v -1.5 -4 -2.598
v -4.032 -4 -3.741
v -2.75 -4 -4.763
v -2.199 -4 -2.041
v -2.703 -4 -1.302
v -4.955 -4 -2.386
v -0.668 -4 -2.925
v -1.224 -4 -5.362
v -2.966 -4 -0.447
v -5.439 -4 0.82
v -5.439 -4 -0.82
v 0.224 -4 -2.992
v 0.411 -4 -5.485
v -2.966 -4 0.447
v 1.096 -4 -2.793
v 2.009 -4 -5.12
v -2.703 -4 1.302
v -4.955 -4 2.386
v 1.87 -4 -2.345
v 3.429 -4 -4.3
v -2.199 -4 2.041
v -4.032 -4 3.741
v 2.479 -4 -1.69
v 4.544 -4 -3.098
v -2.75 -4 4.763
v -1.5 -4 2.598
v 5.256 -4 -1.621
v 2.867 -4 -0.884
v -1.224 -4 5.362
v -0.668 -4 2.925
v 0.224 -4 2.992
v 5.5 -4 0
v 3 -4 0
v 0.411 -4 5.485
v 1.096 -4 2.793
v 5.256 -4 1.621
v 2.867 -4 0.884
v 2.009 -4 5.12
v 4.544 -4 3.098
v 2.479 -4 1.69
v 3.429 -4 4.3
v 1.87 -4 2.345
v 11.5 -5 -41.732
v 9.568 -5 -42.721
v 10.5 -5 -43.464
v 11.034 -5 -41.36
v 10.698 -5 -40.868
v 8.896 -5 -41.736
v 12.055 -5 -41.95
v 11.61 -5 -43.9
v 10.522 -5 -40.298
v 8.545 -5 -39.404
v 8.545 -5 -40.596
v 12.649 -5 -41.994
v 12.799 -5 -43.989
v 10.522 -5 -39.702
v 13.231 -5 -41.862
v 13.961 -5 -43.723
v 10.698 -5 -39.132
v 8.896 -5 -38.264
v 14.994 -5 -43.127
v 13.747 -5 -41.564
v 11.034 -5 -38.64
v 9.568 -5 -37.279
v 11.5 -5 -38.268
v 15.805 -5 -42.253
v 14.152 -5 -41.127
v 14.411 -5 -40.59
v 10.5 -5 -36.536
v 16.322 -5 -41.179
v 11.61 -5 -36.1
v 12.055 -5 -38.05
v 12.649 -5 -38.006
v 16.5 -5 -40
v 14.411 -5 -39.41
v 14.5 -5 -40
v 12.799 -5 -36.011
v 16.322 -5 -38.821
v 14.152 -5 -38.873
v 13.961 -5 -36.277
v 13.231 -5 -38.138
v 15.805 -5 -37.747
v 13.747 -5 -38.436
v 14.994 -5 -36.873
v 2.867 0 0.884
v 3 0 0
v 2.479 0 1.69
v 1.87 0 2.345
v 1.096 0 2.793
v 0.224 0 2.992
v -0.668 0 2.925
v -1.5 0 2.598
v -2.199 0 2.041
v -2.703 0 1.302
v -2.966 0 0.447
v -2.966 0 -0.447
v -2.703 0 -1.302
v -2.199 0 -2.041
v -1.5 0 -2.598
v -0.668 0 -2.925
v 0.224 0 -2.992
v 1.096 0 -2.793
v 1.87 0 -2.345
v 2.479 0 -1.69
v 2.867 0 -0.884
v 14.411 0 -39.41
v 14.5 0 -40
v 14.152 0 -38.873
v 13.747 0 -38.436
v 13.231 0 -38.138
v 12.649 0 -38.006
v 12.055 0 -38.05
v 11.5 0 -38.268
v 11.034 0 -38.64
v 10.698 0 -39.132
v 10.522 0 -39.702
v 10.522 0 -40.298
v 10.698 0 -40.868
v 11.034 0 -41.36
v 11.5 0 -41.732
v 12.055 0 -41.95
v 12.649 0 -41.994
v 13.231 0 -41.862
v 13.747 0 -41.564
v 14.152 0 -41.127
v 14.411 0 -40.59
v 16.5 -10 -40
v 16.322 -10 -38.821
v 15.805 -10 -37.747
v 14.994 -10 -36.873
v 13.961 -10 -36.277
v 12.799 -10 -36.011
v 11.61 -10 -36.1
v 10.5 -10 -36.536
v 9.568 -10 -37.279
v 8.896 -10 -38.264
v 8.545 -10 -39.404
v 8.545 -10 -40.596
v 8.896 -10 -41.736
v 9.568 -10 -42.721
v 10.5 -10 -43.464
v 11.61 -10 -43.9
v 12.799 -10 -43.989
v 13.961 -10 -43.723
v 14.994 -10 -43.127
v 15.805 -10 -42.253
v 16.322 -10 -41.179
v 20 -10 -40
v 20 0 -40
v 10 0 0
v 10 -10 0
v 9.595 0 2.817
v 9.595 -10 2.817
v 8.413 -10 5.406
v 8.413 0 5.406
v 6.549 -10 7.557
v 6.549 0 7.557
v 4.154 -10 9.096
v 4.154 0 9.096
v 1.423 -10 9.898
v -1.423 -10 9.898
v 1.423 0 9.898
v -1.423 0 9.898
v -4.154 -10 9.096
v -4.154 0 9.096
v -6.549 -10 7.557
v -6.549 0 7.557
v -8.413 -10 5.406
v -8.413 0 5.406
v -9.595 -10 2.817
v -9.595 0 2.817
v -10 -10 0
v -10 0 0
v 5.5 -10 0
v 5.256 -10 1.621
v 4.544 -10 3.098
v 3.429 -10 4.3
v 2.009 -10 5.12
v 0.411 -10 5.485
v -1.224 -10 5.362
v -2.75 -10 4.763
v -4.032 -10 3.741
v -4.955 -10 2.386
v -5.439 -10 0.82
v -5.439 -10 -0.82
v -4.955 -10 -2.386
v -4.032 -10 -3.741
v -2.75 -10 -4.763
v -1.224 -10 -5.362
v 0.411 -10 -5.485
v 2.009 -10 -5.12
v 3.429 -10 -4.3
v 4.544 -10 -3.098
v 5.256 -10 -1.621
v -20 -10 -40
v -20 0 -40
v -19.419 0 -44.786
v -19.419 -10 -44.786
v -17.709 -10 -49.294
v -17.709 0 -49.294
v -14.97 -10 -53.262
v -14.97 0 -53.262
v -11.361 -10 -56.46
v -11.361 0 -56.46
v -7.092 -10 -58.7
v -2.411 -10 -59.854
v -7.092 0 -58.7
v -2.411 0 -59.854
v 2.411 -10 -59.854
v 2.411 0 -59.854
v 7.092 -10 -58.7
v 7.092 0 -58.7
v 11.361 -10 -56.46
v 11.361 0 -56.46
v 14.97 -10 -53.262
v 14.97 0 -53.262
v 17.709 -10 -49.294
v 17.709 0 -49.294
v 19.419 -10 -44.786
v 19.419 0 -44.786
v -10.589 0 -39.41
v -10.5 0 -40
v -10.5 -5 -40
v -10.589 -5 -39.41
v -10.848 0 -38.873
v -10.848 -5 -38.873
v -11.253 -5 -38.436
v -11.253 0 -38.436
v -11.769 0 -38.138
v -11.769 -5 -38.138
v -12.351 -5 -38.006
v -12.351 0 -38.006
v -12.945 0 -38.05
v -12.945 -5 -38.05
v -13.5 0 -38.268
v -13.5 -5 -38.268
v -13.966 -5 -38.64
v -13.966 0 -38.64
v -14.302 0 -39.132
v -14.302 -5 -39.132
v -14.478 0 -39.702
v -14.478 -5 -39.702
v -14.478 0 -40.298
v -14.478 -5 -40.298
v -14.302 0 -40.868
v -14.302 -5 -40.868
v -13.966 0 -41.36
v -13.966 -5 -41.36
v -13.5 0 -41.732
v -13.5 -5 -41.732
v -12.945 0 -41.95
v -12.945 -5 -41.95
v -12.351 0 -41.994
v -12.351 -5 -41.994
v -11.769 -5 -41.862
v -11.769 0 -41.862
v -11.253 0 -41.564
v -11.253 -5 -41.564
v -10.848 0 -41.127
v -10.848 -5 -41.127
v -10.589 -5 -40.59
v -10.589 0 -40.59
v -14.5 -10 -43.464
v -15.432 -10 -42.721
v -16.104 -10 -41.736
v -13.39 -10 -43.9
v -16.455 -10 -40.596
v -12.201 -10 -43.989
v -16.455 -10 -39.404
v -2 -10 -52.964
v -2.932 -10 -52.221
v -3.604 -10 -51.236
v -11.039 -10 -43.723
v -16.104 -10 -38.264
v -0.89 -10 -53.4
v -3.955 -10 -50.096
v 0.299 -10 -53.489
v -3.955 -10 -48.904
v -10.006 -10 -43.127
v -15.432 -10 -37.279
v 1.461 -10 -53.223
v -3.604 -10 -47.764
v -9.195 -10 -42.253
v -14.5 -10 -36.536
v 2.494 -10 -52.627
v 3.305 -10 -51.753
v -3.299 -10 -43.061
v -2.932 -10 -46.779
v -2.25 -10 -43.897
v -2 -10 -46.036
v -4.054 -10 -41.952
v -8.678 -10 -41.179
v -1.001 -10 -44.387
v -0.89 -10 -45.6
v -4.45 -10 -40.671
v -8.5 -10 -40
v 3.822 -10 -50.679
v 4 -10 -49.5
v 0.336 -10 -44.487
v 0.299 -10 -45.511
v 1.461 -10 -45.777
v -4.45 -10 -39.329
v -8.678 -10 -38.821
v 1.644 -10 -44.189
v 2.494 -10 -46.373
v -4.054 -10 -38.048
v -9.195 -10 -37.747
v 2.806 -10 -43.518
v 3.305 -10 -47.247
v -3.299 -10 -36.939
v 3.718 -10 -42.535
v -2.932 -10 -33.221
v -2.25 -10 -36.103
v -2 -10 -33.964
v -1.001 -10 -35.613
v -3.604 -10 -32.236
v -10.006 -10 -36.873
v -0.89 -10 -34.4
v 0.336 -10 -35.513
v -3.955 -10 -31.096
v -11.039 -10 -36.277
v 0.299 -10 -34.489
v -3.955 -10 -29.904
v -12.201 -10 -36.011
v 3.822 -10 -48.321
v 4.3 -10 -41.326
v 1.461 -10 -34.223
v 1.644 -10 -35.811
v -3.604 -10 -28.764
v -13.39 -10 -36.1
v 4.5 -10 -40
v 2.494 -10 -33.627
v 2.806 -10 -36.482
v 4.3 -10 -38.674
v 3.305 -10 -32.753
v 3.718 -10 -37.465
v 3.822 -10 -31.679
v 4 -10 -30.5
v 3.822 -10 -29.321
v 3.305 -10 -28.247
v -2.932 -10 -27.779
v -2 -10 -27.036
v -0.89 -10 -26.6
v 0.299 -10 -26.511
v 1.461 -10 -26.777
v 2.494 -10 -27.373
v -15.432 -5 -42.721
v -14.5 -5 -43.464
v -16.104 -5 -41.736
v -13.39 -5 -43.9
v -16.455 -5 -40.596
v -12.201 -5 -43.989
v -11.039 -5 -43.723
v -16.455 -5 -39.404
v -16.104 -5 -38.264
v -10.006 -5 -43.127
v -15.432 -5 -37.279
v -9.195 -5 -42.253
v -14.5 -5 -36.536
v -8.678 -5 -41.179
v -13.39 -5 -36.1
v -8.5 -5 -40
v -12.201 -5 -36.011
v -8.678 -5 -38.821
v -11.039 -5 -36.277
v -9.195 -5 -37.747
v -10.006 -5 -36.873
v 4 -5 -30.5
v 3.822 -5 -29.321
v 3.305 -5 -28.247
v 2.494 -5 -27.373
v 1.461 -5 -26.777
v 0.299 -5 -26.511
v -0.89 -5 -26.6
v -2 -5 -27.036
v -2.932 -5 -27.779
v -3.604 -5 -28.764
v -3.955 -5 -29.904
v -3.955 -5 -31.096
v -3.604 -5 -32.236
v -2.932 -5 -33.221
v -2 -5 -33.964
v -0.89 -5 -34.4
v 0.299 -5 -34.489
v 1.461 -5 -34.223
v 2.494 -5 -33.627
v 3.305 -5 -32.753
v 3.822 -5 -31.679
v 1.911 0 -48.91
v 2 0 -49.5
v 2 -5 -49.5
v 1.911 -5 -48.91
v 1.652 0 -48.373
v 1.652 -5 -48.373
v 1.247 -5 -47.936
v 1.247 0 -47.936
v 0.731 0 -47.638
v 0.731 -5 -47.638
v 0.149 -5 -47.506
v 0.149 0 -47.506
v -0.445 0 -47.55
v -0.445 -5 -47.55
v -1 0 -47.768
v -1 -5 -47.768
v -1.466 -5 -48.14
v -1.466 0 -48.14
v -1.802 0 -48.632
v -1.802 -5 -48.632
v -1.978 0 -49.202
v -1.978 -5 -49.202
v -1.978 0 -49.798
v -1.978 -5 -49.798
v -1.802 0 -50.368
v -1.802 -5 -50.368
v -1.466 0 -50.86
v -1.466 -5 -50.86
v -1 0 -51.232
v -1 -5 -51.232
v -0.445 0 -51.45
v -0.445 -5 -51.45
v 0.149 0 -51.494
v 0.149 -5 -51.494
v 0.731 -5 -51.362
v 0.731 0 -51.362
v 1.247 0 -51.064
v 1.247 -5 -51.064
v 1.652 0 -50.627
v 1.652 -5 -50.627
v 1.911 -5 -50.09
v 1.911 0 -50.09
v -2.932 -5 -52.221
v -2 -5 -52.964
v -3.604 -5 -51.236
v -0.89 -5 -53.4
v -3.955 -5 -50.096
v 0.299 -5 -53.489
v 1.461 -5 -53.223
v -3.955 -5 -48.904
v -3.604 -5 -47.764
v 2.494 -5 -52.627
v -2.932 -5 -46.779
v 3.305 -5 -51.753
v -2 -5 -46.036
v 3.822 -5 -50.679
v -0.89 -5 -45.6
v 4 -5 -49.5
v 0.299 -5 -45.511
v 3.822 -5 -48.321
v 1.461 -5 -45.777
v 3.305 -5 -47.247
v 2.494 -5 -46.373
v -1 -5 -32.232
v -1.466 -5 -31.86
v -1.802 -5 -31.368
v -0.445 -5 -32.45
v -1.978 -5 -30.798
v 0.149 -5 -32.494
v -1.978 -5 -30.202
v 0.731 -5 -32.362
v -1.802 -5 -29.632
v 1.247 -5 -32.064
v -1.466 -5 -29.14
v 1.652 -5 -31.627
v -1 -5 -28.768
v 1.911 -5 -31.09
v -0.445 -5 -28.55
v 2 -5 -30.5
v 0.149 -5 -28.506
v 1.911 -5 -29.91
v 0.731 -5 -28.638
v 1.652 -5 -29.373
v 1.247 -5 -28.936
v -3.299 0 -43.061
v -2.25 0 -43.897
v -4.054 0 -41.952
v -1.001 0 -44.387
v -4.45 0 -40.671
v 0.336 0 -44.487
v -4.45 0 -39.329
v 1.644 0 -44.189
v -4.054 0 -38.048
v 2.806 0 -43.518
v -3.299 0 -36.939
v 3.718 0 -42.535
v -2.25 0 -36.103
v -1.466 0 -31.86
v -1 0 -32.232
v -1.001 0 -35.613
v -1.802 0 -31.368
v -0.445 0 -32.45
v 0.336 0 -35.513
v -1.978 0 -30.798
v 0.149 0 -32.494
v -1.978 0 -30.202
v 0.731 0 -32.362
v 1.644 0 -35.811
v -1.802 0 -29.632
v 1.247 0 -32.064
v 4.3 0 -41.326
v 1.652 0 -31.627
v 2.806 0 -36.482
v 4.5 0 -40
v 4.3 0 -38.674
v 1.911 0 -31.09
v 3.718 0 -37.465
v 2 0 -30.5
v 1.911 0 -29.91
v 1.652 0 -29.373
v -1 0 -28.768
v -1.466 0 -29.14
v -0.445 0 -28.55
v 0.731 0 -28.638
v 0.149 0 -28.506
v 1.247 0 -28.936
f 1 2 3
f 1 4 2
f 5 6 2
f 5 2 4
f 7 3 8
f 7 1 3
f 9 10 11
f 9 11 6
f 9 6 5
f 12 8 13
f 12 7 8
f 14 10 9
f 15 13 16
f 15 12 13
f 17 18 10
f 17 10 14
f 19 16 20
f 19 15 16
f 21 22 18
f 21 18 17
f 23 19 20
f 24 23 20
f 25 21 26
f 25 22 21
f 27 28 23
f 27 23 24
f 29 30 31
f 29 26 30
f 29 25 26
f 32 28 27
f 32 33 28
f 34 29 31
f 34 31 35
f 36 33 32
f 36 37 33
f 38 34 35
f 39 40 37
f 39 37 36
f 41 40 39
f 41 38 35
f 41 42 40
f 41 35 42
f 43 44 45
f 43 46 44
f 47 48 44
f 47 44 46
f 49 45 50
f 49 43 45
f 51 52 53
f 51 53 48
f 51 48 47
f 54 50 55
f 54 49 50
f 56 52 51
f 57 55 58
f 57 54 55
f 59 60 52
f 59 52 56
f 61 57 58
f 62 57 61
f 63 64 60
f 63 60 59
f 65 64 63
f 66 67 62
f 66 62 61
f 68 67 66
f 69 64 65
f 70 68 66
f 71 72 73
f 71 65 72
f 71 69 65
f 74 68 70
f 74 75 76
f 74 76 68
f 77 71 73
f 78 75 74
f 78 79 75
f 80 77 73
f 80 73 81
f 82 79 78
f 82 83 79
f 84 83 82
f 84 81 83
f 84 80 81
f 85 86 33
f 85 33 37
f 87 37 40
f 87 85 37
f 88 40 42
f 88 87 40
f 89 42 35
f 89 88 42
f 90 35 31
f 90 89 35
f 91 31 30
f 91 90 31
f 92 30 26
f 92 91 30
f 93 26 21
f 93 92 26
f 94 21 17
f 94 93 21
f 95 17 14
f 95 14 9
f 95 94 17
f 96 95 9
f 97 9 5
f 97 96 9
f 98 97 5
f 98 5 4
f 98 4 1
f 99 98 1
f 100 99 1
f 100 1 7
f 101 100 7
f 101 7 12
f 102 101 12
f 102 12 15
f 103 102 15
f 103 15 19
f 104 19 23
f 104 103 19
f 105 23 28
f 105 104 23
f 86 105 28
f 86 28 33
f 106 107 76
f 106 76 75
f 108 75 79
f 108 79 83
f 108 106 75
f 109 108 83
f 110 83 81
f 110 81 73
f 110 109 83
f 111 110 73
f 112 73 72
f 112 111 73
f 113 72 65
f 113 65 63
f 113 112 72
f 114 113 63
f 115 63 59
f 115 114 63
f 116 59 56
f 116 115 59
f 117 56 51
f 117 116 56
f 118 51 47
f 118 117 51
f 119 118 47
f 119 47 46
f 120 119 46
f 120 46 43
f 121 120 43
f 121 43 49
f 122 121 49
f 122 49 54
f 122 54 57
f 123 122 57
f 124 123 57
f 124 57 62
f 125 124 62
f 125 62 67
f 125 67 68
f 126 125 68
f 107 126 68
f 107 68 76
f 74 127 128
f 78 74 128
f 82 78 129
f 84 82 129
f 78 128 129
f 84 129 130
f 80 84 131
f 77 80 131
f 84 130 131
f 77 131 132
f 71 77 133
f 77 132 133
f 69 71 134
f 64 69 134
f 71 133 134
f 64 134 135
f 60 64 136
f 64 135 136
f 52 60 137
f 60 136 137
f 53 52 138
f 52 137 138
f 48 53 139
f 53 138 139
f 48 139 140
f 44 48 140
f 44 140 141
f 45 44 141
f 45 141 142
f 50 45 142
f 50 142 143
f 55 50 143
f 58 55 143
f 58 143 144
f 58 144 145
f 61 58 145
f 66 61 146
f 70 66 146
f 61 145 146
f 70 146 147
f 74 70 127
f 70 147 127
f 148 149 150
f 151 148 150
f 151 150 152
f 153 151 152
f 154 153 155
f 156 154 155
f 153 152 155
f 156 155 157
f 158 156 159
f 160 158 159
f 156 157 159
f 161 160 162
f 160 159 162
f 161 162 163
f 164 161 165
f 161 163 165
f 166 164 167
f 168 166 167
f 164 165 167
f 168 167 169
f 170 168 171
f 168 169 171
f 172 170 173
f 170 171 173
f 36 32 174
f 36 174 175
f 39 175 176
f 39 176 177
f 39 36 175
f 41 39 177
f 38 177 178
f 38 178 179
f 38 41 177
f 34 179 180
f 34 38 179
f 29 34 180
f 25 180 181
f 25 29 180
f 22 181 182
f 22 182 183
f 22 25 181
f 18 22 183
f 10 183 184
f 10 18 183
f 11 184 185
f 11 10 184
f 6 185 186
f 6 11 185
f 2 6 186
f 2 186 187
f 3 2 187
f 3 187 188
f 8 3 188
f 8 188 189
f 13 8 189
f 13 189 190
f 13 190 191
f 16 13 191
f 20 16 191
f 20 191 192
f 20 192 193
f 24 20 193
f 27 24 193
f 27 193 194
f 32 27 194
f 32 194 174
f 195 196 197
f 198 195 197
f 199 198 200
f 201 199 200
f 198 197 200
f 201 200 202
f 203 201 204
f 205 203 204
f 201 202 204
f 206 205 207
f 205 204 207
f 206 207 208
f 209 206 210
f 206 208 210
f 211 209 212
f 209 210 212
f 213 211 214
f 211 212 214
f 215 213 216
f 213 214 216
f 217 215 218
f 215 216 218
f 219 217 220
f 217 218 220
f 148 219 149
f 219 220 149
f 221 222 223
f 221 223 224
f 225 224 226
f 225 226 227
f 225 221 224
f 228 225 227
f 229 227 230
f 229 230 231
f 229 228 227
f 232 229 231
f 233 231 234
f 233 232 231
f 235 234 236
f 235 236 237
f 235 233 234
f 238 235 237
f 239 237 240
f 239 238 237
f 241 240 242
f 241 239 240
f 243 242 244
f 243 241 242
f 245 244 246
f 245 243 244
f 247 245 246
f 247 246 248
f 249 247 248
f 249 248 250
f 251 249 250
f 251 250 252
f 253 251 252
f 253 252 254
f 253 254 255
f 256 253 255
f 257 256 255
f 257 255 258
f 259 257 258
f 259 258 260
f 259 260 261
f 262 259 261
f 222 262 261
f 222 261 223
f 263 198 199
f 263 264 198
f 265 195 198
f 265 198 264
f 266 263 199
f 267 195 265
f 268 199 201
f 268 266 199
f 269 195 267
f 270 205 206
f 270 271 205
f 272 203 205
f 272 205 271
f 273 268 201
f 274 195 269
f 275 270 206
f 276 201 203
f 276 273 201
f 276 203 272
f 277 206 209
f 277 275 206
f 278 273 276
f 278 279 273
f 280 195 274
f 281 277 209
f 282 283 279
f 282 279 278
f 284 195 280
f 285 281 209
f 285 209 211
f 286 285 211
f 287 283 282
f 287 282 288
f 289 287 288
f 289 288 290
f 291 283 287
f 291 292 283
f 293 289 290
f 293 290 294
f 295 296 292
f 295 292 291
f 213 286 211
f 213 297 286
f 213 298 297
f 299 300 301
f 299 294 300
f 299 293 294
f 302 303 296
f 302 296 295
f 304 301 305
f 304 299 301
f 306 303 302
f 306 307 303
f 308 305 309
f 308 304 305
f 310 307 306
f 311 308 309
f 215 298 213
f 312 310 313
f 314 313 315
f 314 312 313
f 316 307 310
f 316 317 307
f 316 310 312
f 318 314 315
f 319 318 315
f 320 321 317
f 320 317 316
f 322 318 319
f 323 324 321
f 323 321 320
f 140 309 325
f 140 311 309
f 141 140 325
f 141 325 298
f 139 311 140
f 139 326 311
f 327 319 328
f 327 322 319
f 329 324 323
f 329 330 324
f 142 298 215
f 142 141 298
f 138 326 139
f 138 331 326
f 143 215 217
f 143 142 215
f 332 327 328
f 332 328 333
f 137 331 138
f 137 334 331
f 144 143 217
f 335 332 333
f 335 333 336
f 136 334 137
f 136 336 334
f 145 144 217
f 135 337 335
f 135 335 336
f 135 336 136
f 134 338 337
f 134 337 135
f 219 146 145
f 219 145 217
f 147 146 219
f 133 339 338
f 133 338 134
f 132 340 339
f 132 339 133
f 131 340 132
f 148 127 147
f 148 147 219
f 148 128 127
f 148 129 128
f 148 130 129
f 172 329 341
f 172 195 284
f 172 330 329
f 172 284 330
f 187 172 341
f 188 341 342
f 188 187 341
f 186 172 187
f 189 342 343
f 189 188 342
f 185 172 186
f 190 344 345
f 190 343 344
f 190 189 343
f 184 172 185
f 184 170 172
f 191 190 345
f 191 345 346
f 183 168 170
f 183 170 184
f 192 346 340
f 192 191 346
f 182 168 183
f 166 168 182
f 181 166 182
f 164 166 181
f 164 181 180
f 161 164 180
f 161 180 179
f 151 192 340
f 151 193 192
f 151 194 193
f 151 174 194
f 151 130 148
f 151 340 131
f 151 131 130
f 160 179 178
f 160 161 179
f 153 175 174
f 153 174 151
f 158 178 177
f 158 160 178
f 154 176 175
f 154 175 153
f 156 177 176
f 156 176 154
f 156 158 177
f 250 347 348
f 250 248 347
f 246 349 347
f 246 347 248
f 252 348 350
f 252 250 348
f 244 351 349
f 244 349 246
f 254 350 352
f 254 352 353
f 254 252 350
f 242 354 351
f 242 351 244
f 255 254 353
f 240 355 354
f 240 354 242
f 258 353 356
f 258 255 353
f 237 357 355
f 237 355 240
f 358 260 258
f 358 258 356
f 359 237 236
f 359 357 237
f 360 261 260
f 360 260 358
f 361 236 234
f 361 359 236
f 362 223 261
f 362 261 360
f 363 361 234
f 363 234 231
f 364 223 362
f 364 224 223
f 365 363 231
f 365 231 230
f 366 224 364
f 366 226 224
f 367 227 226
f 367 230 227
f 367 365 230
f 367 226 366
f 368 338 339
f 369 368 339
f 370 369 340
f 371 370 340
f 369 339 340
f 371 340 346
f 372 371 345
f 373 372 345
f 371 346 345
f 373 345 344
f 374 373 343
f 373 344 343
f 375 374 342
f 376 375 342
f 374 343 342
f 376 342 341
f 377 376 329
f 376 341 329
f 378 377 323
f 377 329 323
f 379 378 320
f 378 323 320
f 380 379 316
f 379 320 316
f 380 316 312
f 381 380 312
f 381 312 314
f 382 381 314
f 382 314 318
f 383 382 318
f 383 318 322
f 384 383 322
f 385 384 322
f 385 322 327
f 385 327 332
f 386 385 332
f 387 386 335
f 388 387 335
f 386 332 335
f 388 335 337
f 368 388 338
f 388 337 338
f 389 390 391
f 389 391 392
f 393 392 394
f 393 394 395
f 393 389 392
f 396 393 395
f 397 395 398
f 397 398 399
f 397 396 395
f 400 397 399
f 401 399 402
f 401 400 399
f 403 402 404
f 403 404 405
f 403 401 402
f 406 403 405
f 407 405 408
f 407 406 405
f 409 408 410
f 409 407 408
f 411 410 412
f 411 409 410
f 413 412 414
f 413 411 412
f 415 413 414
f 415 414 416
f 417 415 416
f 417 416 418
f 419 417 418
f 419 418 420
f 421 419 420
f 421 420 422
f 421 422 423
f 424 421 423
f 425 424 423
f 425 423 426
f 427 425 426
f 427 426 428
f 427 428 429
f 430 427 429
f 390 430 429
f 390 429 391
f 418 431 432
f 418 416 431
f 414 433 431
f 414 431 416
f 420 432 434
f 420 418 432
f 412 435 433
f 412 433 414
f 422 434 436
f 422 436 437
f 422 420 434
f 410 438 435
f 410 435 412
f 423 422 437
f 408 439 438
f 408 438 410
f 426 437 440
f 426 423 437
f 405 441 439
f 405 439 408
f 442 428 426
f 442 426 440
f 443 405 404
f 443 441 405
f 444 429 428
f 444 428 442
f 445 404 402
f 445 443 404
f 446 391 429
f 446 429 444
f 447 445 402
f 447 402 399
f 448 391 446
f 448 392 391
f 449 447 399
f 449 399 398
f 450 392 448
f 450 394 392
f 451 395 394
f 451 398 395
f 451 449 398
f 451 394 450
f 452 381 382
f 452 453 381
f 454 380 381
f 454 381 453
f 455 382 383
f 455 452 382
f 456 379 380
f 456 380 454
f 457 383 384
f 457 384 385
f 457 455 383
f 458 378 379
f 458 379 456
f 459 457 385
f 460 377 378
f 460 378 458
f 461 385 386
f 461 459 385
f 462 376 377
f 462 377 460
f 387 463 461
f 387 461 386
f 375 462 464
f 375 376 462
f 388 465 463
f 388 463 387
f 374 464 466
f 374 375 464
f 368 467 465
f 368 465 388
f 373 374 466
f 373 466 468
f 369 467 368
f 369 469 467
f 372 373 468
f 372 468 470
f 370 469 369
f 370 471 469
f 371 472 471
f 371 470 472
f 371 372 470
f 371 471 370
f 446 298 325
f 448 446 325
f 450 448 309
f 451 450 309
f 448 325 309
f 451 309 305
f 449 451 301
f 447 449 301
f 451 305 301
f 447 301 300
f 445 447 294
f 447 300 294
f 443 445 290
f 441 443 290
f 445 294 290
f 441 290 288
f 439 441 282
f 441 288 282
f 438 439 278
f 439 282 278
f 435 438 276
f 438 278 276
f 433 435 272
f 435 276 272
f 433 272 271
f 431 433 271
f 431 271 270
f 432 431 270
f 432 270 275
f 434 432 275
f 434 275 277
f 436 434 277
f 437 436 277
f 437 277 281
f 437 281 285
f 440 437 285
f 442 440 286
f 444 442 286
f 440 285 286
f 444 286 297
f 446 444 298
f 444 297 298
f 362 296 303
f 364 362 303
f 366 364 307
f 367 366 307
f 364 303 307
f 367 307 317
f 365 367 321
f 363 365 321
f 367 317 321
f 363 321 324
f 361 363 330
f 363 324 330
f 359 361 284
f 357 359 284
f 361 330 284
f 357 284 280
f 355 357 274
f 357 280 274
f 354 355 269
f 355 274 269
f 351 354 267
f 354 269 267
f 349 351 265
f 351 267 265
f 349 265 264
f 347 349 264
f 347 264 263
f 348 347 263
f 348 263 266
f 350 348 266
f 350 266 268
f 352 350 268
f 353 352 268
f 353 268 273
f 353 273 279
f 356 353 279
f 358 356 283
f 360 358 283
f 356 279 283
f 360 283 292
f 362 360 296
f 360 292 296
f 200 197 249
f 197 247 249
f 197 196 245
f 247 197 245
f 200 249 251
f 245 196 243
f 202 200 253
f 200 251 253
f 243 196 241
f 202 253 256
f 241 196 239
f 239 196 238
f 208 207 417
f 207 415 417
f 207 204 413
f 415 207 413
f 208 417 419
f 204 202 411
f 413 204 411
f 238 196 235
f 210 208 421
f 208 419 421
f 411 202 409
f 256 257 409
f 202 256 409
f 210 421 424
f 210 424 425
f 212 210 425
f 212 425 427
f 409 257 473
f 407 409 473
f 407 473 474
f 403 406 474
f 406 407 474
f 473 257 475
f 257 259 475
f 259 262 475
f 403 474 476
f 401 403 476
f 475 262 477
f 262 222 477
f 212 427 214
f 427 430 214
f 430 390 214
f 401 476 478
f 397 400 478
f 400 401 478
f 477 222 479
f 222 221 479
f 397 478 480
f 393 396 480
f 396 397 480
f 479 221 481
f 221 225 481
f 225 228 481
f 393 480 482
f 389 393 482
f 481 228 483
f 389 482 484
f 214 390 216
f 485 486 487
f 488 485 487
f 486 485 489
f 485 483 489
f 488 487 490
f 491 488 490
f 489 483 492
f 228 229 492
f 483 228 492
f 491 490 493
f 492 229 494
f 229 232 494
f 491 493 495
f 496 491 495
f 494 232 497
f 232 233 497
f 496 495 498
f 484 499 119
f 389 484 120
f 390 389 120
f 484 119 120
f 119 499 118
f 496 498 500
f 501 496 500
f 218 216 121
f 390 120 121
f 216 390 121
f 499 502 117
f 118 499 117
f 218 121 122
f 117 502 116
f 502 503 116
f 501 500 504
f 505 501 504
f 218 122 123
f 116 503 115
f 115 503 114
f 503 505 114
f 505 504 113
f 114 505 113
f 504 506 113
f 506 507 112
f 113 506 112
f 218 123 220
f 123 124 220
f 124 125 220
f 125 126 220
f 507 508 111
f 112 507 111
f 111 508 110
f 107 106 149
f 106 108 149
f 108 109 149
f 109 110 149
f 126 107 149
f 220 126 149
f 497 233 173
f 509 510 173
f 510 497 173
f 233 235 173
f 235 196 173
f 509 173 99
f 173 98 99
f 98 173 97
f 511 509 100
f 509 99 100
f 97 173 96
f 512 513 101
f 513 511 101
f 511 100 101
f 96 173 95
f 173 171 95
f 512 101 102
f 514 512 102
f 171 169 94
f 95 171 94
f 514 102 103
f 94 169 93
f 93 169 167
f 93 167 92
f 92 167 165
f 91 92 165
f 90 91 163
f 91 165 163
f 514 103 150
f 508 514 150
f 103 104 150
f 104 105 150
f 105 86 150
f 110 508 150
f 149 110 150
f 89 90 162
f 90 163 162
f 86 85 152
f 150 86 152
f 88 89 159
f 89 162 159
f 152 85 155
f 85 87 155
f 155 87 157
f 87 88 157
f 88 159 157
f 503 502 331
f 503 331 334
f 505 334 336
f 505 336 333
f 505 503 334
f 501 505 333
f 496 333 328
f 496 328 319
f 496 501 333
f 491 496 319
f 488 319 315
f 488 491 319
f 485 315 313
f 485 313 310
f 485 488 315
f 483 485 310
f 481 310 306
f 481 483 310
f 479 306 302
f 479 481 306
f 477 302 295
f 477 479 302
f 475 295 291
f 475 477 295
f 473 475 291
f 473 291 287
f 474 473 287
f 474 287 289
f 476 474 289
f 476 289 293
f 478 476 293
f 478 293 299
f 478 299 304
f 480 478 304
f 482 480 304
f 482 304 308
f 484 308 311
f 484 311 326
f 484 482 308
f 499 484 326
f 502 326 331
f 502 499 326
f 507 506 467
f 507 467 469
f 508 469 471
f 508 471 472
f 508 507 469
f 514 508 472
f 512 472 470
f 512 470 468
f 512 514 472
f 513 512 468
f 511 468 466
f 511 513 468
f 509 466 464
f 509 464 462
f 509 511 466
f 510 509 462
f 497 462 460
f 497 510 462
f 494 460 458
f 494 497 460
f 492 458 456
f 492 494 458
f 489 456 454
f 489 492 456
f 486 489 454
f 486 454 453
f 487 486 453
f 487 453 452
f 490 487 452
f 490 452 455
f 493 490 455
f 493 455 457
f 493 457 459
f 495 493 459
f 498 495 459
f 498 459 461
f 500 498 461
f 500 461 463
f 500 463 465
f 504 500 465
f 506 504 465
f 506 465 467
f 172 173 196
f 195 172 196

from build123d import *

# Parameters (mm, degrees)
F0_R     = 2
F0_R_2   = 4.5
F0_R_3   = 5.5
F1_DEPTH = 10
F0_R_4   = 3
F2_DEPTH = 4
F3_R     = 4
F3_R_2   = 2
F4_DEPTH = 5


with BuildPart() as f1:
    # F0 (on Front) → F1 (new body)
    with BuildSketch(Plane.XZ):
        with BuildLine():
            Line((20, -40), (10, 0))
            ThreePointArc((10, 0), (0, 10), (-10, 0))
            Line((-10, 0), (-20, -40))
            ThreePointArc((-20, -40), (0, -60), (20, -40))
        make_face()
        with Locations((-12.5, -40)):
            Circle(F0_R, mode=Mode.SUBTRACT)
        with Locations((0, -49.5)):
            Circle(F0_R, mode=Mode.SUBTRACT)
        with Locations((0, -40)):
            Circle(F0_R_2, mode=Mode.SUBTRACT)
        with Locations((0, -30.5)):
            Circle(F0_R, mode=Mode.SUBTRACT)
        with Locations((12.5, -40)):
            Circle(F0_R, mode=Mode.SUBTRACT)
        Circle(F0_R_3, mode=Mode.SUBTRACT)
    extrude(amount=F1_DEPTH)

    # F0 (on Front) → F2 (join)
    with BuildSketch(Plane.XZ):
        Circle(F0_R_3)
        Circle(F0_R_4, mode=Mode.SUBTRACT)
    extrude(amount=F2_DEPTH)

    # F3 (on face) → F4 (cut)
    with BuildSketch(Plane.XZ.offset(10)):
        with Locations((0, -30.5)):
            Circle(F3_R)
        with Locations((0, -30.5)):
            Circle(F3_R_2, mode=Mode.SUBTRACT)
        with Locations((-12.5, -40)):
            Circle(F3_R)
        with Locations((-12.5, -40)):
            Circle(F3_R_2, mode=Mode.SUBTRACT)
        with Locations((0, -49.5)):
            Circle(F3_R)
        with Locations((0, -49.5)):
            Circle(F3_R_2, mode=Mode.SUBTRACT)
        with Locations((12.5, -40)):
            Circle(F3_R)
        with Locations((12.5, -40)):
            Circle(F3_R_2, mode=Mode.SUBTRACT)
    extrude(amount=-F4_DEPTH, mode=Mode.SUBTRACT)


solid = f1.part
